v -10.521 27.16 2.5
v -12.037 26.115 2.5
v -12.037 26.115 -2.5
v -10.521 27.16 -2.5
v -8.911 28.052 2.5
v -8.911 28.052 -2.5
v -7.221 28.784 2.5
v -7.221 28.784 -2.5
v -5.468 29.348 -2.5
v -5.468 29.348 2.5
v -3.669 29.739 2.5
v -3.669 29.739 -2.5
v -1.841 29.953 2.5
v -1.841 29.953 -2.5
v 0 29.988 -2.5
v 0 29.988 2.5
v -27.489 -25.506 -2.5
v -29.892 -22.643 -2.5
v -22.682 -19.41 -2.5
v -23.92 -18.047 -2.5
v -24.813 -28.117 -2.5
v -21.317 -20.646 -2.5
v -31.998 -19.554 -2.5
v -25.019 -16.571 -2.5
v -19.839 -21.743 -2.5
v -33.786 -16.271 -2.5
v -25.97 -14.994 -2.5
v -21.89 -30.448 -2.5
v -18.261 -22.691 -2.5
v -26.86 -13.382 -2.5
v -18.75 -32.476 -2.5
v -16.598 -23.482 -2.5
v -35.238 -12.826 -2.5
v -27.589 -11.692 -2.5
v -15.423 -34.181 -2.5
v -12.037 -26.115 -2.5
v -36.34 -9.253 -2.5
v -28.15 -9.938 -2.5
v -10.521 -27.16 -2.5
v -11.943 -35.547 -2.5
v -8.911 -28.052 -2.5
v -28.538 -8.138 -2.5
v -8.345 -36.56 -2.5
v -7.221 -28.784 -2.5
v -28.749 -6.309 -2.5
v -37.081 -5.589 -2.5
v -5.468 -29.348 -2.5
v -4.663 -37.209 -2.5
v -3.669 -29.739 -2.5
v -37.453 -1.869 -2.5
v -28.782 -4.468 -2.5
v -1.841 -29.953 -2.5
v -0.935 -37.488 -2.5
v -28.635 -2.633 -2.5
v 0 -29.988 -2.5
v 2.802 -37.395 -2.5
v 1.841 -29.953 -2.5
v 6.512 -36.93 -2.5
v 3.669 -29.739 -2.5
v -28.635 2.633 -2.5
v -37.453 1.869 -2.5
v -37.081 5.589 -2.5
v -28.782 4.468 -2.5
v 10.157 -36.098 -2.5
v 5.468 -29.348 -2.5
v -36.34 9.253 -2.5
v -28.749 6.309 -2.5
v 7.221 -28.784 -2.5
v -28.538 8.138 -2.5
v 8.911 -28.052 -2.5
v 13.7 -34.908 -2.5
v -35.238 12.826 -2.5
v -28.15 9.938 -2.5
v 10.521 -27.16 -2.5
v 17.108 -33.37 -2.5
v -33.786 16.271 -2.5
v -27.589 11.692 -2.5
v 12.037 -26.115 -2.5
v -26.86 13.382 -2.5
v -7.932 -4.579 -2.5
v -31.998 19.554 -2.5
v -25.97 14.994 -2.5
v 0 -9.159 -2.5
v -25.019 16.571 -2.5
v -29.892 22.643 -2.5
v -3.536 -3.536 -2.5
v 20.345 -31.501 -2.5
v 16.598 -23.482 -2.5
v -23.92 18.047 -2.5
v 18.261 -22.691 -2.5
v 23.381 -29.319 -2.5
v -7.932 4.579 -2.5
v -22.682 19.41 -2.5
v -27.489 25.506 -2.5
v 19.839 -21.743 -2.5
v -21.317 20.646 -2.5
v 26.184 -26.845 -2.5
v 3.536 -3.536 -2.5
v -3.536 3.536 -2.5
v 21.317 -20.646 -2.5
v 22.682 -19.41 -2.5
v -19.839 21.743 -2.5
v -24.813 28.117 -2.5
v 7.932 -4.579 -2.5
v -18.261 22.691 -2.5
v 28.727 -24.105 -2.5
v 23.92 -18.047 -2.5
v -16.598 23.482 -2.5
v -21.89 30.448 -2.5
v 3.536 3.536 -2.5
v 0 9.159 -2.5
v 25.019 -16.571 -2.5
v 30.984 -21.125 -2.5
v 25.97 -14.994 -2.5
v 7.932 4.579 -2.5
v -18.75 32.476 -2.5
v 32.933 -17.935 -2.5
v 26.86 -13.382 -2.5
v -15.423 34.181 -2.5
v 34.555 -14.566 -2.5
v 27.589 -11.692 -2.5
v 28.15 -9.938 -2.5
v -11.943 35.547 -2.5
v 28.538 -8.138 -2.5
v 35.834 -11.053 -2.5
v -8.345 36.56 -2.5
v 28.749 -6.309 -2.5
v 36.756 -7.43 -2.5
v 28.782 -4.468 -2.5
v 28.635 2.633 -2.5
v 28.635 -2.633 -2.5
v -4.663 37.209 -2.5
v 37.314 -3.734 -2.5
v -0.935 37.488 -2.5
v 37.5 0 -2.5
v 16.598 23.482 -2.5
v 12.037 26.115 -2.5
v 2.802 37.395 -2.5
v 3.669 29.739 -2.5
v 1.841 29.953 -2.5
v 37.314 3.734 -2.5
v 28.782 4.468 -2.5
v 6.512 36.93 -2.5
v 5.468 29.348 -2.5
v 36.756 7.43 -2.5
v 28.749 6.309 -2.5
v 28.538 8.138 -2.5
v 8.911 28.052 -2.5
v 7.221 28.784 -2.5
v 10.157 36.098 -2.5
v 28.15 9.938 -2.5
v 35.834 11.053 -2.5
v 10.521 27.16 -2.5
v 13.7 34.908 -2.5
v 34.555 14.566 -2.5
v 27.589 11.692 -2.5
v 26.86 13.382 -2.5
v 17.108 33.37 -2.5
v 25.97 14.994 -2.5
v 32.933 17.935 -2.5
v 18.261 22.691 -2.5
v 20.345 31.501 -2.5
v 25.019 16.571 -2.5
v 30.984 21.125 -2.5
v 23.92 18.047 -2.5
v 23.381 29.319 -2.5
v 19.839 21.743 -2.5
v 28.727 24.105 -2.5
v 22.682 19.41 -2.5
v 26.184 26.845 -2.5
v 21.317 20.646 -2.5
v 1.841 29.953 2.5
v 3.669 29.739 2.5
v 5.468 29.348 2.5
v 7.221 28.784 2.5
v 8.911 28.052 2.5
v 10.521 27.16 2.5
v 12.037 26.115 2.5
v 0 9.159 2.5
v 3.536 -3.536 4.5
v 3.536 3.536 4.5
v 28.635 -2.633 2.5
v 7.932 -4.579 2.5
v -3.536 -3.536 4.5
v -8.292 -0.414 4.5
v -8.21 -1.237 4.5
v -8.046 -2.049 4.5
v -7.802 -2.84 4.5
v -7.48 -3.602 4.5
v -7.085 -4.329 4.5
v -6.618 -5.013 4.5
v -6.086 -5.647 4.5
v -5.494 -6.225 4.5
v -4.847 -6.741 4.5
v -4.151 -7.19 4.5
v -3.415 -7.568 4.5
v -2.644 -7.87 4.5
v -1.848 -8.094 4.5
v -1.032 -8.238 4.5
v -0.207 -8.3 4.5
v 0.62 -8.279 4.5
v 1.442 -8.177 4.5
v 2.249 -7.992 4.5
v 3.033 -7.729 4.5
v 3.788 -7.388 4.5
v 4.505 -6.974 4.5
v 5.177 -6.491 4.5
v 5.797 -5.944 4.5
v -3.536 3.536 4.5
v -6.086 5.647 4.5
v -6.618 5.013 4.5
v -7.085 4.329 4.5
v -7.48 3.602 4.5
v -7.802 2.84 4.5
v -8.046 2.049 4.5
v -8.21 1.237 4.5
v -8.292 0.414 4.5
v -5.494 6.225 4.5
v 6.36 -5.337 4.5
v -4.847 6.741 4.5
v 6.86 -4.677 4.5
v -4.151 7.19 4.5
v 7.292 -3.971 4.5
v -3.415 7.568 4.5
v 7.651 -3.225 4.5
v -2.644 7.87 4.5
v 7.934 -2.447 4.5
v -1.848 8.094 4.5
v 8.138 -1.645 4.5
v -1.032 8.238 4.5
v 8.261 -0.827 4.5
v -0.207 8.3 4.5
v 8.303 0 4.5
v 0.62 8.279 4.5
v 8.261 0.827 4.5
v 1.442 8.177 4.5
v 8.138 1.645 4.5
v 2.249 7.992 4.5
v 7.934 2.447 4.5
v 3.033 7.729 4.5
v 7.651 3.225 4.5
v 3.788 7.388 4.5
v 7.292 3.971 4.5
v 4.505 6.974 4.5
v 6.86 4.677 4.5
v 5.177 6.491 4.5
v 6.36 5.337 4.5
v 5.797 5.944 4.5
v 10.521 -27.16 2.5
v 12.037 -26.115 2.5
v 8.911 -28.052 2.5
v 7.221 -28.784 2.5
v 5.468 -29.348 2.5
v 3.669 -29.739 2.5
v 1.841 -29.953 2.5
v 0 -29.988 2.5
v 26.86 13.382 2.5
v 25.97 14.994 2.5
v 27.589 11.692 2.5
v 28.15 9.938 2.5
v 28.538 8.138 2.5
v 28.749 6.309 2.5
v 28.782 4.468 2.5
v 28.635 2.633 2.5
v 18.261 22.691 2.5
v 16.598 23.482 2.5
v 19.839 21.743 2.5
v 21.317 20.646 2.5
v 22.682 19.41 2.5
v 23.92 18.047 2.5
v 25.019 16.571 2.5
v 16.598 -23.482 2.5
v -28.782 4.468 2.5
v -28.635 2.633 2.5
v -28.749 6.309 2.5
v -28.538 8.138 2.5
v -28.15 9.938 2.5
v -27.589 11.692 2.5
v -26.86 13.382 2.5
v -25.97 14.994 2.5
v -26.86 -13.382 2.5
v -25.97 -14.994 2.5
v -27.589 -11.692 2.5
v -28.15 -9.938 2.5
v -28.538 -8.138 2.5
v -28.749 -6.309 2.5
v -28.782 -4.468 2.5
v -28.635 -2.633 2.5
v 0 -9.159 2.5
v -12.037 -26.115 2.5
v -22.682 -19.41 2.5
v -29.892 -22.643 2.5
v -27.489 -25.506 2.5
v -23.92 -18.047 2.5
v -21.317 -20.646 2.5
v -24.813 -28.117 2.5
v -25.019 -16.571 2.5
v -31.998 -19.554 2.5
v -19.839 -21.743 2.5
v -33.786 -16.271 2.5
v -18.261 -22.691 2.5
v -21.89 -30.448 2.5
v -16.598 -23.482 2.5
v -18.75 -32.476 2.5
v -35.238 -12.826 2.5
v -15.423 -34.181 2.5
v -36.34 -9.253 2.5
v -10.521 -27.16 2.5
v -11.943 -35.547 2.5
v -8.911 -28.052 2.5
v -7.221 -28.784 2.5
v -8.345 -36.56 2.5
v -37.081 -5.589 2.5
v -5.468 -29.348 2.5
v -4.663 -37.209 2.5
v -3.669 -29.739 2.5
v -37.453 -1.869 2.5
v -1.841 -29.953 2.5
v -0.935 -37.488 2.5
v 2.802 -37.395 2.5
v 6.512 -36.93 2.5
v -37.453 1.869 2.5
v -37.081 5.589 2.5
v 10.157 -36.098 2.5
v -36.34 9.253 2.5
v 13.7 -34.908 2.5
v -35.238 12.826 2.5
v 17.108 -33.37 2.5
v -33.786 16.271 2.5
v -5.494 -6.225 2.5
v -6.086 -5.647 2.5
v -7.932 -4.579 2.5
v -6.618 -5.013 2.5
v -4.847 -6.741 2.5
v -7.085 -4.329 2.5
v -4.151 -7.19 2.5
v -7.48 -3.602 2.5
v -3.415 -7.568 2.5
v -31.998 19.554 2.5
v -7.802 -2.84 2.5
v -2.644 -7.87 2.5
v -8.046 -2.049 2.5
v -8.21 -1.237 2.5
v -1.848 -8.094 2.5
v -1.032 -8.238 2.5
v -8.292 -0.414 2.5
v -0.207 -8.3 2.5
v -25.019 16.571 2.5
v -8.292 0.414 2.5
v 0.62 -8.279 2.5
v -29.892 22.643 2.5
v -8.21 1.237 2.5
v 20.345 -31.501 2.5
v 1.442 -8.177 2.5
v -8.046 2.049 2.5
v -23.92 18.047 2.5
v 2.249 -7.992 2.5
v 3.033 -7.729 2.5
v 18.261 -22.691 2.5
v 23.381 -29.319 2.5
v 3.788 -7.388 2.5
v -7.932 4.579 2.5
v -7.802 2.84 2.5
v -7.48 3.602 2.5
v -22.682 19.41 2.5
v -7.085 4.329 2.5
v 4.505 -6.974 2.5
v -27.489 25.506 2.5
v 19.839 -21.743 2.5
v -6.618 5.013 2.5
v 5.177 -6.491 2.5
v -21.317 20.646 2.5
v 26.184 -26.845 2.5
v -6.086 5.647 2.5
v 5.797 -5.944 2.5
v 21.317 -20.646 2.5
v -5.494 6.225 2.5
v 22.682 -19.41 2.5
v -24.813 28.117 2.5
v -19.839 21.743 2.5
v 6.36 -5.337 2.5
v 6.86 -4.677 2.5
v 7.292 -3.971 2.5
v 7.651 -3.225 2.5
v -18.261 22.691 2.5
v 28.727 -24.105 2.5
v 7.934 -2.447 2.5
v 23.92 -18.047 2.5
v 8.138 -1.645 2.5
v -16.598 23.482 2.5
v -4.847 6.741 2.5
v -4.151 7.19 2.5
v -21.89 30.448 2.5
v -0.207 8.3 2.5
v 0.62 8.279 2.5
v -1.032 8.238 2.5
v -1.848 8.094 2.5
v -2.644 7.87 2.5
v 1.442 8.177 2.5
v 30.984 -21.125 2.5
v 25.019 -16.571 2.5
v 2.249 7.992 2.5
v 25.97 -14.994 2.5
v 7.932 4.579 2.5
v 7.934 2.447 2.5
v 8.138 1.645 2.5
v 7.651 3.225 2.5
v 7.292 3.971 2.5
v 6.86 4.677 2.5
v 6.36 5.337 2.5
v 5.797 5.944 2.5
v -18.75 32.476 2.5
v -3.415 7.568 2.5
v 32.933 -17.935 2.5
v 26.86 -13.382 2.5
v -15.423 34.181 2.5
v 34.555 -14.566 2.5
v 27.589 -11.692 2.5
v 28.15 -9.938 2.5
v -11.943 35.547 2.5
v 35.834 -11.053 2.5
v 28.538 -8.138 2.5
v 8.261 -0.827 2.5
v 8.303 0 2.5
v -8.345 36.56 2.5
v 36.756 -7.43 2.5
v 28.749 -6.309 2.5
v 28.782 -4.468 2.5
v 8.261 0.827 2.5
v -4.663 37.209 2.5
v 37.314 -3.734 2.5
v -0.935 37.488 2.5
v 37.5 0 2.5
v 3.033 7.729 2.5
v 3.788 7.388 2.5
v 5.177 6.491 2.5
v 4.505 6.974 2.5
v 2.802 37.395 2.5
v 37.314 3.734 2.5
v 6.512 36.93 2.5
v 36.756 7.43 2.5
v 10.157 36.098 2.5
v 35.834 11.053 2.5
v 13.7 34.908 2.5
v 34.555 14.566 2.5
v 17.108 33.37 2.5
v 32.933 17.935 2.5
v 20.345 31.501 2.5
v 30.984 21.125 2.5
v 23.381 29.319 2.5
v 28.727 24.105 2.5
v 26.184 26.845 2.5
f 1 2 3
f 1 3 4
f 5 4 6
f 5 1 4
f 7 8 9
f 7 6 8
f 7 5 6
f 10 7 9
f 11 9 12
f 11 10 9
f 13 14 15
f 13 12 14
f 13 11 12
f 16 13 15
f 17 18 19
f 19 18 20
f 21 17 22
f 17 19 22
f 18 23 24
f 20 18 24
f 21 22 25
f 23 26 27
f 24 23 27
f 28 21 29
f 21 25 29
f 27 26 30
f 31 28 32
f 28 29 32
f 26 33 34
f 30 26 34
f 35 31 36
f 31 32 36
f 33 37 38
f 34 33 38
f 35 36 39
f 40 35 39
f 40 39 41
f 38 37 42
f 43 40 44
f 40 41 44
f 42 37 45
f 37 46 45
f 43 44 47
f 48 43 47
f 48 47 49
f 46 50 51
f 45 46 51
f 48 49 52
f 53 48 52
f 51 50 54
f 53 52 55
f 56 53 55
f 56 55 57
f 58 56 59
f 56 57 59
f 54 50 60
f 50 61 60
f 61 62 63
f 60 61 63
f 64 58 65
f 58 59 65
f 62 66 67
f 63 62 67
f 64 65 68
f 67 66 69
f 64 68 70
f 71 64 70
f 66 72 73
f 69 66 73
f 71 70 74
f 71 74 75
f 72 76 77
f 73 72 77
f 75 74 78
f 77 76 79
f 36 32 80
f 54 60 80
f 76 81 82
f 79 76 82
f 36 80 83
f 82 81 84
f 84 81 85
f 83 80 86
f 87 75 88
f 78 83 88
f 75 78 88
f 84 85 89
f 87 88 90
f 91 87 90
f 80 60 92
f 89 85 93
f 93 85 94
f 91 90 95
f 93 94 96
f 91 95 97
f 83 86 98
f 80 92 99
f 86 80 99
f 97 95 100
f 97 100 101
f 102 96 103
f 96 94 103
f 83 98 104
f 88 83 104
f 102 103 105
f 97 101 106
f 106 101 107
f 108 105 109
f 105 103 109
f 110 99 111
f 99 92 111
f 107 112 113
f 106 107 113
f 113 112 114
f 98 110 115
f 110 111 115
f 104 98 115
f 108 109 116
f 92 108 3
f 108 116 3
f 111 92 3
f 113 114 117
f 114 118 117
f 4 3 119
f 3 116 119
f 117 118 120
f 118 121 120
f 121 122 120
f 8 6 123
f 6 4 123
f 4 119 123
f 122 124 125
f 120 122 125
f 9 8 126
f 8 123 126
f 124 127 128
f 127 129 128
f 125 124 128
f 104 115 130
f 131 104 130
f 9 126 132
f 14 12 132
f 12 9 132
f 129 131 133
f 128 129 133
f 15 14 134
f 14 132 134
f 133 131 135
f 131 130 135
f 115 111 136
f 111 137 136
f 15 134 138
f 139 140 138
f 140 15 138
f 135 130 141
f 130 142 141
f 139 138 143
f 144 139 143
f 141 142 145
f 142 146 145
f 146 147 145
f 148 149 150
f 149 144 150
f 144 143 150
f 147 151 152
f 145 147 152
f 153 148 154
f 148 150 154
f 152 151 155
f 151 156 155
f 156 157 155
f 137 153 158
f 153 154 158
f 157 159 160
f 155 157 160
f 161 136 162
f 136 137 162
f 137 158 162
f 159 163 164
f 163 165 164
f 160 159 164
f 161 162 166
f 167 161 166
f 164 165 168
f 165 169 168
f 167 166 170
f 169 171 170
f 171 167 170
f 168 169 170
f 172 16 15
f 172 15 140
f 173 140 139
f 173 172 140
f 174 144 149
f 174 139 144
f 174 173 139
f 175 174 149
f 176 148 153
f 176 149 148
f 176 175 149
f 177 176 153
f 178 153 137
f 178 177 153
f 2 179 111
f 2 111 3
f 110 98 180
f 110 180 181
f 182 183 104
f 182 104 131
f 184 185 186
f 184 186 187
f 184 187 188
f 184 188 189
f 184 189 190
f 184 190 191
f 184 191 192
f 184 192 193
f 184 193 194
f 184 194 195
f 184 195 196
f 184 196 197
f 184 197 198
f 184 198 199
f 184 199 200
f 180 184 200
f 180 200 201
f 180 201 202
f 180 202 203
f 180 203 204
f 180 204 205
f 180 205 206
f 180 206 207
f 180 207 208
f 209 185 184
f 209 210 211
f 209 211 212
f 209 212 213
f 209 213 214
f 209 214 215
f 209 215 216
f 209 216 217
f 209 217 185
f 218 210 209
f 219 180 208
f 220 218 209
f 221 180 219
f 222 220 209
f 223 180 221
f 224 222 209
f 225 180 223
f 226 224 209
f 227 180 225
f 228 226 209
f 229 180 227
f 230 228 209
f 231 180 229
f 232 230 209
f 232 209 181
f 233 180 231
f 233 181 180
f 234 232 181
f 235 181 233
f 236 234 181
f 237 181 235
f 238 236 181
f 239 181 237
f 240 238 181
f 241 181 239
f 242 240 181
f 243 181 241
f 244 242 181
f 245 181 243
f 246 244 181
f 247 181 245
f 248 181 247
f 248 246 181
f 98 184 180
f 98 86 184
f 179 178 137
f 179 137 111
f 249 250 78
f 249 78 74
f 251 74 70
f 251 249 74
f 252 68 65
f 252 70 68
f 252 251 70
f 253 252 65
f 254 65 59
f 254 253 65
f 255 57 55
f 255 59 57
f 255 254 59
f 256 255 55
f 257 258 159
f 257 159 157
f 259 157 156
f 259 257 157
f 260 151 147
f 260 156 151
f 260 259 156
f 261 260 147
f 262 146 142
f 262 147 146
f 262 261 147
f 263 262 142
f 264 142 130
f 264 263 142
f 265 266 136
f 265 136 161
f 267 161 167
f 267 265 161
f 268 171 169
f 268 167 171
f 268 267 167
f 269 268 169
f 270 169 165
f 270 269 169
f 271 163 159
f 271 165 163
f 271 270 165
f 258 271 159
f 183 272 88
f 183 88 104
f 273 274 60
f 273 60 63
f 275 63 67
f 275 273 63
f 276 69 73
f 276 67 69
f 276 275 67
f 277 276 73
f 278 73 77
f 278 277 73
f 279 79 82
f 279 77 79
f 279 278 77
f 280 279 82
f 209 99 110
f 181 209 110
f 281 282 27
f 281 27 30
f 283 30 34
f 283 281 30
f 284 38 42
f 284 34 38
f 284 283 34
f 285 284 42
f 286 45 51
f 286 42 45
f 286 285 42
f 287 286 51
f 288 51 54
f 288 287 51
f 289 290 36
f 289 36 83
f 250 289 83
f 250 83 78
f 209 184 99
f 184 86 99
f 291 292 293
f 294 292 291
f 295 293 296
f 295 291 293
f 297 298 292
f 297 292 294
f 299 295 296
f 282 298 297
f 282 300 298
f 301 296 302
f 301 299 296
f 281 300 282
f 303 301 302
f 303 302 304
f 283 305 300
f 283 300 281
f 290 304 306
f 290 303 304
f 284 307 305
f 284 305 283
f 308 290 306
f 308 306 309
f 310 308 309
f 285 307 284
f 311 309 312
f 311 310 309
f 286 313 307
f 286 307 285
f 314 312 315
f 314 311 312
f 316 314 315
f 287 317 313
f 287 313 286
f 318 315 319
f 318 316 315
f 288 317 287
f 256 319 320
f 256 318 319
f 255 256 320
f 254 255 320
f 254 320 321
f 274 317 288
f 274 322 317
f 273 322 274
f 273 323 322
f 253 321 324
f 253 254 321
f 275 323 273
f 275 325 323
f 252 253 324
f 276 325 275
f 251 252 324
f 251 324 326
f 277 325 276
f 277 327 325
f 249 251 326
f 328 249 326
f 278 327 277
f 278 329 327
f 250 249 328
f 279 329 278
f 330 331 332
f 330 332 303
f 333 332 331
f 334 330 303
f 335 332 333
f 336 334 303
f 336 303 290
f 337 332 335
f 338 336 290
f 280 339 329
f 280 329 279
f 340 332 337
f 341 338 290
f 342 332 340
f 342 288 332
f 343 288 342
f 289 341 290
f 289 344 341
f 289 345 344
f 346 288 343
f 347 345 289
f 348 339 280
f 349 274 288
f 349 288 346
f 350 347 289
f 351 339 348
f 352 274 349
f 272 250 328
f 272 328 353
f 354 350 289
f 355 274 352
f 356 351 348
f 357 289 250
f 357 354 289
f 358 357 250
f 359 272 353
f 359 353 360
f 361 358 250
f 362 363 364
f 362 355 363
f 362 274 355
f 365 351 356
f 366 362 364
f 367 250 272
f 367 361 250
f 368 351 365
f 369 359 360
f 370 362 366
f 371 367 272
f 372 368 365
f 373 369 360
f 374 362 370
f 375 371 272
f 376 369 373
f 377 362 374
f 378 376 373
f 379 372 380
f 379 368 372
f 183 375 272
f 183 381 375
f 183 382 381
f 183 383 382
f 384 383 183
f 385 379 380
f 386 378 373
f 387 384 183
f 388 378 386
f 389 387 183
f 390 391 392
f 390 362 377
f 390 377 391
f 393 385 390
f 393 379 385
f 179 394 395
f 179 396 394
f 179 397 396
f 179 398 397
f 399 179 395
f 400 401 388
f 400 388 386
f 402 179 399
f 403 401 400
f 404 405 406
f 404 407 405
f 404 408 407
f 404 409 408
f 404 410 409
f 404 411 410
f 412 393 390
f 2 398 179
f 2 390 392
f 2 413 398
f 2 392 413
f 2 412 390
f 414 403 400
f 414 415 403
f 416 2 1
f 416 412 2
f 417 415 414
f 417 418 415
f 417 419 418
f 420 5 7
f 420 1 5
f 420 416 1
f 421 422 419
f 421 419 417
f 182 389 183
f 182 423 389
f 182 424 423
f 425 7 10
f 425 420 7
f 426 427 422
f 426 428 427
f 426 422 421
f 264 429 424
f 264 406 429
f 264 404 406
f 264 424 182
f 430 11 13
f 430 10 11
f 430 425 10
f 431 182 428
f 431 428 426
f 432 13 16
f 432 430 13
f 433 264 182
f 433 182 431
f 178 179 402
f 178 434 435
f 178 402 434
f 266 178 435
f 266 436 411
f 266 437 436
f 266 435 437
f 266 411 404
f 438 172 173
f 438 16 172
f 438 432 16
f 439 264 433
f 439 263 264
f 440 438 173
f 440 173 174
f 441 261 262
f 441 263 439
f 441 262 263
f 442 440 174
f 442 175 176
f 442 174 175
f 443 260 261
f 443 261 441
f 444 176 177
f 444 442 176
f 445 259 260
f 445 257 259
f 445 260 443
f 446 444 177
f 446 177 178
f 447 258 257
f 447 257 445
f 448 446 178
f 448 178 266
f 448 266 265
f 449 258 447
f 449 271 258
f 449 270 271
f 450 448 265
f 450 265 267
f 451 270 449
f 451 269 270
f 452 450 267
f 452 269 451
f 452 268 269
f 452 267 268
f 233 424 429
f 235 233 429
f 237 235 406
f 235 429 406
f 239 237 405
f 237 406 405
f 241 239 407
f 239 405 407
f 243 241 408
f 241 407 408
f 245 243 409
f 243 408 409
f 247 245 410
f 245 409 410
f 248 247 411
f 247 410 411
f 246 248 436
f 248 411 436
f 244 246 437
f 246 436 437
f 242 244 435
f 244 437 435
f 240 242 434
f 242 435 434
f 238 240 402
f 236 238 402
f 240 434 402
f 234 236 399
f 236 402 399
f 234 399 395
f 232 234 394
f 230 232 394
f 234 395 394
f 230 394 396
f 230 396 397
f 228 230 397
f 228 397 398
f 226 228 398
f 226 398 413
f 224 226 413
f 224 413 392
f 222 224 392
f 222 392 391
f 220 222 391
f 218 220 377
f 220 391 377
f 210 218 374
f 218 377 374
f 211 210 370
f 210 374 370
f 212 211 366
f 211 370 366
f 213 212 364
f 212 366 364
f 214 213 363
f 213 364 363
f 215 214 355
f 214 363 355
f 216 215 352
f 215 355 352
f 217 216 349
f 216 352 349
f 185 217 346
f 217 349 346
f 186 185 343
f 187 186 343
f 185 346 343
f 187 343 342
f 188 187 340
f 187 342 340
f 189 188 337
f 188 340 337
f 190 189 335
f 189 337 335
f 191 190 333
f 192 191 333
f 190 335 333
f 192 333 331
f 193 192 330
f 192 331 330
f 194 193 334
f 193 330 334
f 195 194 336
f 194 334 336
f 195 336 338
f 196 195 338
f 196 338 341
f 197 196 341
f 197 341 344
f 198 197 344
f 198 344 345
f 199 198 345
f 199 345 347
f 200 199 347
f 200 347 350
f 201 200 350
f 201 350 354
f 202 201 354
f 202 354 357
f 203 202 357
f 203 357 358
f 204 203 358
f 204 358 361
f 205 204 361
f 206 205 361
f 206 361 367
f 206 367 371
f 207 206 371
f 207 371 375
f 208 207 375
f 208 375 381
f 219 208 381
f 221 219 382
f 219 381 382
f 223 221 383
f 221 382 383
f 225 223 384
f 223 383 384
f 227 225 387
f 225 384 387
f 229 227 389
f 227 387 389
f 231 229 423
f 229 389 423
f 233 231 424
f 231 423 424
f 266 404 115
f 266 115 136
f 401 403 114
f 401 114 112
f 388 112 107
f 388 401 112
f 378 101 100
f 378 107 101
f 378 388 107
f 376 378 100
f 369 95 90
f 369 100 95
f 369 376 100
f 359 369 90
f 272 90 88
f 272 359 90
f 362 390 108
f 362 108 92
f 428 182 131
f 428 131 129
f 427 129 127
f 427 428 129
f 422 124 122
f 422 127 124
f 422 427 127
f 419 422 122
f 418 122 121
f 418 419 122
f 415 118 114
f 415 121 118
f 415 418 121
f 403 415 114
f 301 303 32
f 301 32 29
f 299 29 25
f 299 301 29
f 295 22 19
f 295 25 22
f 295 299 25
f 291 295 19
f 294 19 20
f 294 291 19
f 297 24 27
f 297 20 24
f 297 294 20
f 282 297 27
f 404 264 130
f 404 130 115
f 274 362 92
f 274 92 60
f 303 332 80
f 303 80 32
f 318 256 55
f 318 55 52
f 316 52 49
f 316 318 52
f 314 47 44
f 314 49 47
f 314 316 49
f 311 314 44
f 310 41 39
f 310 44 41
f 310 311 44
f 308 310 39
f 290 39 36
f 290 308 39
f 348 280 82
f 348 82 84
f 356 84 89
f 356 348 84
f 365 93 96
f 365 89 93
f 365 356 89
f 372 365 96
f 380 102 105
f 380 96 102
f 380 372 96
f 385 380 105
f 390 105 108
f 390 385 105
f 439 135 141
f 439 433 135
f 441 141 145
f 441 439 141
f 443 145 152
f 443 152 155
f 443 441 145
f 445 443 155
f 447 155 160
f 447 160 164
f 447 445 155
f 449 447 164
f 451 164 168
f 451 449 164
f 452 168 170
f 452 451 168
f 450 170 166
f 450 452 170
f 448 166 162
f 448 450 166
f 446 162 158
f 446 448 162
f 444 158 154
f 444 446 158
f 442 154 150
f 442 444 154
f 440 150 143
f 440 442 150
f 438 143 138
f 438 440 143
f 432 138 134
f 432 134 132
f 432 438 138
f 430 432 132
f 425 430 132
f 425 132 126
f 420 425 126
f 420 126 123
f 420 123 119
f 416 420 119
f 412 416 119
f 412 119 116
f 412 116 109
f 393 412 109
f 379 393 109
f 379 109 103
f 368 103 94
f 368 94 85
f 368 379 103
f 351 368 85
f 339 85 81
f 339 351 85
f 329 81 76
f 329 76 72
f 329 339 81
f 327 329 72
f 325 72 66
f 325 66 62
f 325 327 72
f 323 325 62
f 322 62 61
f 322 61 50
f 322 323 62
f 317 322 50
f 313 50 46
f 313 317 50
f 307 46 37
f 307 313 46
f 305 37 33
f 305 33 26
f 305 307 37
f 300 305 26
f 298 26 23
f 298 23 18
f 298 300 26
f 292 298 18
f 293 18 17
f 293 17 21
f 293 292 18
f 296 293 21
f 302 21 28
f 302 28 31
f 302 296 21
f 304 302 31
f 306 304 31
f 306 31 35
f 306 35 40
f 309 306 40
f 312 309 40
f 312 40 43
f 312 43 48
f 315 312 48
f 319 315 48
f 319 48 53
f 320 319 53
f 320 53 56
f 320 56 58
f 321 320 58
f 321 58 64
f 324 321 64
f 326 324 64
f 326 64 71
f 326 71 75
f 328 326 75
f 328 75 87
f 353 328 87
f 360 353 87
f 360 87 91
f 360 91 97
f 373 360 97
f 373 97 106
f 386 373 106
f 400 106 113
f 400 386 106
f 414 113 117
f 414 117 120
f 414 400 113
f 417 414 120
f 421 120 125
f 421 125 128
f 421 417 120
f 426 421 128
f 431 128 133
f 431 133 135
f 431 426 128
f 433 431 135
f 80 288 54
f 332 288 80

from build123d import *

# Parameters (mm, degrees)
SKETCH1_R           = 37.5
SKETCH1_W           = 7.071067812
SKETCH1_H           = 7.071067812
BOSS_EXTRUDE1_DEPTH = 2.5
CUT_EXTRUDE1_DEPTH  = 4
CIRPATTERN1_COUNT   = 6
SKETCH4_R           = 8.302662018
SKETCH4_W           = 7.071067812
SKETCH4_H           = 7.071067812
BOSS_EXTRUDE2_DEPTH = 2


with BuildPart() as part:
    # Sketch1 → Boss-Extrude1 (new, symmetric)
    with BuildSketch(Plane.XY):
        Circle(SKETCH1_R)
        Rectangle(SKETCH1_W, SKETCH1_H, mode=Mode.SUBTRACT)
    extrude(amount=BOSS_EXTRUDE1_DEPTH, both=True)

    # Sketch2 → Cut-Extrude1 (cut, symmetric)
    with BuildSketch(Plane.XY):
        with BuildLine():
            Line((0, 9.158641407), (-12.037071564, 26.115211784))
            ThreePointArc((-12.037071564, 26.115211784), (-6.351662121, 29.087034336), (0, 29.988143709))
            ThreePointArc((0, 29.988143709), (6.351662121, 29.087034336), (12.037071564, 26.115211784))
            Line((12.037071564, 26.115211784), (0, 9.158641407))
        make_face()
    cut_extrude1 = extrude(amount=CUT_EXTRUDE1_DEPTH, both=True, mode=Mode.SUBTRACT)

    # CirPattern1: Cut-Extrude1 ×6 about axis
    cirpattern1_axis = Axis((0, 0, 0), (0, 0, 1))
    for i in range(1, CIRPATTERN1_COUNT):
        add(cut_extrude1.rotate(cirpattern1_axis, i * 360 / CIRPATTERN1_COUNT), mode=Mode.SUBTRACT)

    # Sketch4 → Boss-Extrude2 (add)
    with BuildSketch(Plane.XY.offset(2.5)):
        Circle(SKETCH4_R)
        Rectangle(SKETCH4_W, SKETCH4_H, mode=Mode.SUBTRACT)
    extrude(amount=BOSS_EXTRUDE2_DEPTH)


solid = part.part
